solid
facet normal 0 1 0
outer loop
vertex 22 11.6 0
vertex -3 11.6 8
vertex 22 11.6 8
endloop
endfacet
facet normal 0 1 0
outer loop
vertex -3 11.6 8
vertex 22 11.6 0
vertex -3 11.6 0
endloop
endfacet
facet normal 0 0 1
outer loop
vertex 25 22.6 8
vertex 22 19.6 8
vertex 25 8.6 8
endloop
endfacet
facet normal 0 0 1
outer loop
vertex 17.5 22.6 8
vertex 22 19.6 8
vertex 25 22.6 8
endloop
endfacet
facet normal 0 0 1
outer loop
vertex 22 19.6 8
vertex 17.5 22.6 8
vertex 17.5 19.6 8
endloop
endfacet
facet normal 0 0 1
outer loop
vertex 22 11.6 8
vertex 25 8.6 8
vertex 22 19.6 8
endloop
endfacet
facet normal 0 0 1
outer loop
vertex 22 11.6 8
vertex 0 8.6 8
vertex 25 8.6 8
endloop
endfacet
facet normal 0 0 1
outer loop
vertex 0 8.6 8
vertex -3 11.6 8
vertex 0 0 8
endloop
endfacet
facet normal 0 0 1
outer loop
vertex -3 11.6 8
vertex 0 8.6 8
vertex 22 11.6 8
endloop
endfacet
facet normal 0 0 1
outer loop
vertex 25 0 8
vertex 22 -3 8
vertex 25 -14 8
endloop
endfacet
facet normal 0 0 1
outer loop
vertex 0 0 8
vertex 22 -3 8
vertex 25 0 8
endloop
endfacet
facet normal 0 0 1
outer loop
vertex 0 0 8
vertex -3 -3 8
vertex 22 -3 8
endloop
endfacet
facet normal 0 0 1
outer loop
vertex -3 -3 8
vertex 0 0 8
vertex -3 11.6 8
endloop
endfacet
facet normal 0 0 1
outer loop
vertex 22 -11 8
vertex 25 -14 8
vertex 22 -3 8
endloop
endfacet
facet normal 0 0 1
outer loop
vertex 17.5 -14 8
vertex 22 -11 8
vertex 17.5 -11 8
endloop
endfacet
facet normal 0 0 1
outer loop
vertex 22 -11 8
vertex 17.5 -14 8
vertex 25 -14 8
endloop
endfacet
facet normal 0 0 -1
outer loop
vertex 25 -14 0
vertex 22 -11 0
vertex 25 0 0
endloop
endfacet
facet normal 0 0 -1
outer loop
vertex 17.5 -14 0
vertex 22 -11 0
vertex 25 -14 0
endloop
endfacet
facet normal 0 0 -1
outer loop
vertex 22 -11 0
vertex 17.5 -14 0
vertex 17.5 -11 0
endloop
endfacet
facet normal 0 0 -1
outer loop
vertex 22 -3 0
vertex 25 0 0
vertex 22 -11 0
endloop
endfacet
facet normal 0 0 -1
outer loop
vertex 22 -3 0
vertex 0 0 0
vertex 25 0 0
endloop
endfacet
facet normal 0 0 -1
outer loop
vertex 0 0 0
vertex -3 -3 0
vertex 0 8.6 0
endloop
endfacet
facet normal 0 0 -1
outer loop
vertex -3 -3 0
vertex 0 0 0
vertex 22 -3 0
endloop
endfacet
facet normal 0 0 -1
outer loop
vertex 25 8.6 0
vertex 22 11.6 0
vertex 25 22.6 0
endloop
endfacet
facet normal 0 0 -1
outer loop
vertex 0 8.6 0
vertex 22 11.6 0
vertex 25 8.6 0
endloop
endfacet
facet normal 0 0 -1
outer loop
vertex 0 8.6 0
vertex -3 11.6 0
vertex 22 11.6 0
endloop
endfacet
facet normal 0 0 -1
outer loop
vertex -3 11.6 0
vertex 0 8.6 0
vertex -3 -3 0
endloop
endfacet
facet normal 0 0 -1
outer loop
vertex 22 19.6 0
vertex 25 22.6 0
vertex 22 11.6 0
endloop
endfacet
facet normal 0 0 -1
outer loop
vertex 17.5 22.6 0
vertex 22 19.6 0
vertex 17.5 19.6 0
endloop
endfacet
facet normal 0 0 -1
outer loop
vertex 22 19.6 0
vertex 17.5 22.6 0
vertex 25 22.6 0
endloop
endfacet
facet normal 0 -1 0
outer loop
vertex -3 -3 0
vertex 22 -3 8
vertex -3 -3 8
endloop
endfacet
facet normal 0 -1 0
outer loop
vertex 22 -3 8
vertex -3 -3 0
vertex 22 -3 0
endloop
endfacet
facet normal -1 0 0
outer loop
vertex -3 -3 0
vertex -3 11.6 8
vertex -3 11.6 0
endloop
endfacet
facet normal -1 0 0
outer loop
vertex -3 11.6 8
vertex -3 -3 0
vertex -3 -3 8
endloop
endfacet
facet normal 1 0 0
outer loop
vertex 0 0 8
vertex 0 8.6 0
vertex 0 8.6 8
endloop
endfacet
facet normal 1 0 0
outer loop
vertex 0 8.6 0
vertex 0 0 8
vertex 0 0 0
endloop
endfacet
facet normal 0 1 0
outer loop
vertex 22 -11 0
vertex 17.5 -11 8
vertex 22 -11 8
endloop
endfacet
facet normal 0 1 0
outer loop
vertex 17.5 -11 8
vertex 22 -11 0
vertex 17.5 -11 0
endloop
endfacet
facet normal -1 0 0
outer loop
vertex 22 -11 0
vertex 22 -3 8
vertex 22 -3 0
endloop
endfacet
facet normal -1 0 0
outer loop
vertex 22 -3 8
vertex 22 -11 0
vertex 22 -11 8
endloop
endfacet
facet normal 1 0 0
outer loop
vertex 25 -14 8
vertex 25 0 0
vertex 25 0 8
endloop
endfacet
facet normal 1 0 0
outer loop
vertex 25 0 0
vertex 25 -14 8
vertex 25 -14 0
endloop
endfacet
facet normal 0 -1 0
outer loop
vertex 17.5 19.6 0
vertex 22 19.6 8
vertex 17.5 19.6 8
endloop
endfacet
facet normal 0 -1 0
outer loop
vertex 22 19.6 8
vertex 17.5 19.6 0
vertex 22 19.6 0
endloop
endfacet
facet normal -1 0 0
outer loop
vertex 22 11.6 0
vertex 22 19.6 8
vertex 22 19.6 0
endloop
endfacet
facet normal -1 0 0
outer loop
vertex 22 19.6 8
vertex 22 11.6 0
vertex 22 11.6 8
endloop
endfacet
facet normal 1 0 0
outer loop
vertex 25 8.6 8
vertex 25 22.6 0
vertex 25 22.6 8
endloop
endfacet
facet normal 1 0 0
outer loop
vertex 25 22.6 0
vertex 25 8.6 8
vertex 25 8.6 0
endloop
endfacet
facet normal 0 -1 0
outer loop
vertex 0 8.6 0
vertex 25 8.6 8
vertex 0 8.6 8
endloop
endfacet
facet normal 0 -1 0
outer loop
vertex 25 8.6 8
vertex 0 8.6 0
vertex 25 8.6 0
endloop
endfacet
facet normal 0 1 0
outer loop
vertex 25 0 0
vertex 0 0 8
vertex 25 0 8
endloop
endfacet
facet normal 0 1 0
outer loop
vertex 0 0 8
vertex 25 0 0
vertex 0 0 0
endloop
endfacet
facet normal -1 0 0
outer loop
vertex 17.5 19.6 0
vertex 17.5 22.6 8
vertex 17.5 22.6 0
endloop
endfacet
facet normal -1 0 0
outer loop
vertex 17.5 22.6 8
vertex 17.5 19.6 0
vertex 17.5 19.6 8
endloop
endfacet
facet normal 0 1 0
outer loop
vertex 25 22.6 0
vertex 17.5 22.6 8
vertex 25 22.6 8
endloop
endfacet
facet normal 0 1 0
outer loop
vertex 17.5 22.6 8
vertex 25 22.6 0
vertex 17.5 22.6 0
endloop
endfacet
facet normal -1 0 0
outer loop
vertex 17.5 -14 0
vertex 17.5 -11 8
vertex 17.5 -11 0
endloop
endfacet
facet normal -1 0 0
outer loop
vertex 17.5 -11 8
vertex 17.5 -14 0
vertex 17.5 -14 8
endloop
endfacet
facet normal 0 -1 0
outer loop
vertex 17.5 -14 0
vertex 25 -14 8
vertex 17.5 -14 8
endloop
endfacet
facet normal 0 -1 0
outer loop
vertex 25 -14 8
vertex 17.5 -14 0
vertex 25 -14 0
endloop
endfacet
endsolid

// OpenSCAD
structure_thickness = 3;
width = 8;
wall_thickness = 8.6;

length = 25;
hook_depth = 8;
hook_heigth = 4.5;

//right towards the wall
translate([0, wall_thickness, 0])
cube([length, structure_thickness, width]);


//left towards the wall
translate([0, -structure_thickness, 0])
cube([length, structure_thickness, width]);

bottom_x = length - hook_heigth - structure_thickness;
//rigth hook
translate([bottom_x, wall_thickness + hook_depth + structure_thickness, 0])
cube([hook_heigth + structure_thickness, structure_thickness, width]);

//left hook
translate([bottom_x, -(structure_thickness*2 + hook_depth), 0])
cube([hook_heigth + structure_thickness, structure_thickness, width]);


//flats
rotate([0, 0, 90])
union() {
    
    //top
    translate([-structure_thickness, 0, 0])
    cube([wall_thickness + structure_thickness*2, structure_thickness, width]);

    //left
    translate([-structure_thickness - hook_depth, -length, 0])
    cube([hook_depth, structure_thickness, width]);
    
    //right
    translate([wall_thickness+structure_thickness, -length, 0])
    cube([hook_depth, structure_thickness, width]);
}
